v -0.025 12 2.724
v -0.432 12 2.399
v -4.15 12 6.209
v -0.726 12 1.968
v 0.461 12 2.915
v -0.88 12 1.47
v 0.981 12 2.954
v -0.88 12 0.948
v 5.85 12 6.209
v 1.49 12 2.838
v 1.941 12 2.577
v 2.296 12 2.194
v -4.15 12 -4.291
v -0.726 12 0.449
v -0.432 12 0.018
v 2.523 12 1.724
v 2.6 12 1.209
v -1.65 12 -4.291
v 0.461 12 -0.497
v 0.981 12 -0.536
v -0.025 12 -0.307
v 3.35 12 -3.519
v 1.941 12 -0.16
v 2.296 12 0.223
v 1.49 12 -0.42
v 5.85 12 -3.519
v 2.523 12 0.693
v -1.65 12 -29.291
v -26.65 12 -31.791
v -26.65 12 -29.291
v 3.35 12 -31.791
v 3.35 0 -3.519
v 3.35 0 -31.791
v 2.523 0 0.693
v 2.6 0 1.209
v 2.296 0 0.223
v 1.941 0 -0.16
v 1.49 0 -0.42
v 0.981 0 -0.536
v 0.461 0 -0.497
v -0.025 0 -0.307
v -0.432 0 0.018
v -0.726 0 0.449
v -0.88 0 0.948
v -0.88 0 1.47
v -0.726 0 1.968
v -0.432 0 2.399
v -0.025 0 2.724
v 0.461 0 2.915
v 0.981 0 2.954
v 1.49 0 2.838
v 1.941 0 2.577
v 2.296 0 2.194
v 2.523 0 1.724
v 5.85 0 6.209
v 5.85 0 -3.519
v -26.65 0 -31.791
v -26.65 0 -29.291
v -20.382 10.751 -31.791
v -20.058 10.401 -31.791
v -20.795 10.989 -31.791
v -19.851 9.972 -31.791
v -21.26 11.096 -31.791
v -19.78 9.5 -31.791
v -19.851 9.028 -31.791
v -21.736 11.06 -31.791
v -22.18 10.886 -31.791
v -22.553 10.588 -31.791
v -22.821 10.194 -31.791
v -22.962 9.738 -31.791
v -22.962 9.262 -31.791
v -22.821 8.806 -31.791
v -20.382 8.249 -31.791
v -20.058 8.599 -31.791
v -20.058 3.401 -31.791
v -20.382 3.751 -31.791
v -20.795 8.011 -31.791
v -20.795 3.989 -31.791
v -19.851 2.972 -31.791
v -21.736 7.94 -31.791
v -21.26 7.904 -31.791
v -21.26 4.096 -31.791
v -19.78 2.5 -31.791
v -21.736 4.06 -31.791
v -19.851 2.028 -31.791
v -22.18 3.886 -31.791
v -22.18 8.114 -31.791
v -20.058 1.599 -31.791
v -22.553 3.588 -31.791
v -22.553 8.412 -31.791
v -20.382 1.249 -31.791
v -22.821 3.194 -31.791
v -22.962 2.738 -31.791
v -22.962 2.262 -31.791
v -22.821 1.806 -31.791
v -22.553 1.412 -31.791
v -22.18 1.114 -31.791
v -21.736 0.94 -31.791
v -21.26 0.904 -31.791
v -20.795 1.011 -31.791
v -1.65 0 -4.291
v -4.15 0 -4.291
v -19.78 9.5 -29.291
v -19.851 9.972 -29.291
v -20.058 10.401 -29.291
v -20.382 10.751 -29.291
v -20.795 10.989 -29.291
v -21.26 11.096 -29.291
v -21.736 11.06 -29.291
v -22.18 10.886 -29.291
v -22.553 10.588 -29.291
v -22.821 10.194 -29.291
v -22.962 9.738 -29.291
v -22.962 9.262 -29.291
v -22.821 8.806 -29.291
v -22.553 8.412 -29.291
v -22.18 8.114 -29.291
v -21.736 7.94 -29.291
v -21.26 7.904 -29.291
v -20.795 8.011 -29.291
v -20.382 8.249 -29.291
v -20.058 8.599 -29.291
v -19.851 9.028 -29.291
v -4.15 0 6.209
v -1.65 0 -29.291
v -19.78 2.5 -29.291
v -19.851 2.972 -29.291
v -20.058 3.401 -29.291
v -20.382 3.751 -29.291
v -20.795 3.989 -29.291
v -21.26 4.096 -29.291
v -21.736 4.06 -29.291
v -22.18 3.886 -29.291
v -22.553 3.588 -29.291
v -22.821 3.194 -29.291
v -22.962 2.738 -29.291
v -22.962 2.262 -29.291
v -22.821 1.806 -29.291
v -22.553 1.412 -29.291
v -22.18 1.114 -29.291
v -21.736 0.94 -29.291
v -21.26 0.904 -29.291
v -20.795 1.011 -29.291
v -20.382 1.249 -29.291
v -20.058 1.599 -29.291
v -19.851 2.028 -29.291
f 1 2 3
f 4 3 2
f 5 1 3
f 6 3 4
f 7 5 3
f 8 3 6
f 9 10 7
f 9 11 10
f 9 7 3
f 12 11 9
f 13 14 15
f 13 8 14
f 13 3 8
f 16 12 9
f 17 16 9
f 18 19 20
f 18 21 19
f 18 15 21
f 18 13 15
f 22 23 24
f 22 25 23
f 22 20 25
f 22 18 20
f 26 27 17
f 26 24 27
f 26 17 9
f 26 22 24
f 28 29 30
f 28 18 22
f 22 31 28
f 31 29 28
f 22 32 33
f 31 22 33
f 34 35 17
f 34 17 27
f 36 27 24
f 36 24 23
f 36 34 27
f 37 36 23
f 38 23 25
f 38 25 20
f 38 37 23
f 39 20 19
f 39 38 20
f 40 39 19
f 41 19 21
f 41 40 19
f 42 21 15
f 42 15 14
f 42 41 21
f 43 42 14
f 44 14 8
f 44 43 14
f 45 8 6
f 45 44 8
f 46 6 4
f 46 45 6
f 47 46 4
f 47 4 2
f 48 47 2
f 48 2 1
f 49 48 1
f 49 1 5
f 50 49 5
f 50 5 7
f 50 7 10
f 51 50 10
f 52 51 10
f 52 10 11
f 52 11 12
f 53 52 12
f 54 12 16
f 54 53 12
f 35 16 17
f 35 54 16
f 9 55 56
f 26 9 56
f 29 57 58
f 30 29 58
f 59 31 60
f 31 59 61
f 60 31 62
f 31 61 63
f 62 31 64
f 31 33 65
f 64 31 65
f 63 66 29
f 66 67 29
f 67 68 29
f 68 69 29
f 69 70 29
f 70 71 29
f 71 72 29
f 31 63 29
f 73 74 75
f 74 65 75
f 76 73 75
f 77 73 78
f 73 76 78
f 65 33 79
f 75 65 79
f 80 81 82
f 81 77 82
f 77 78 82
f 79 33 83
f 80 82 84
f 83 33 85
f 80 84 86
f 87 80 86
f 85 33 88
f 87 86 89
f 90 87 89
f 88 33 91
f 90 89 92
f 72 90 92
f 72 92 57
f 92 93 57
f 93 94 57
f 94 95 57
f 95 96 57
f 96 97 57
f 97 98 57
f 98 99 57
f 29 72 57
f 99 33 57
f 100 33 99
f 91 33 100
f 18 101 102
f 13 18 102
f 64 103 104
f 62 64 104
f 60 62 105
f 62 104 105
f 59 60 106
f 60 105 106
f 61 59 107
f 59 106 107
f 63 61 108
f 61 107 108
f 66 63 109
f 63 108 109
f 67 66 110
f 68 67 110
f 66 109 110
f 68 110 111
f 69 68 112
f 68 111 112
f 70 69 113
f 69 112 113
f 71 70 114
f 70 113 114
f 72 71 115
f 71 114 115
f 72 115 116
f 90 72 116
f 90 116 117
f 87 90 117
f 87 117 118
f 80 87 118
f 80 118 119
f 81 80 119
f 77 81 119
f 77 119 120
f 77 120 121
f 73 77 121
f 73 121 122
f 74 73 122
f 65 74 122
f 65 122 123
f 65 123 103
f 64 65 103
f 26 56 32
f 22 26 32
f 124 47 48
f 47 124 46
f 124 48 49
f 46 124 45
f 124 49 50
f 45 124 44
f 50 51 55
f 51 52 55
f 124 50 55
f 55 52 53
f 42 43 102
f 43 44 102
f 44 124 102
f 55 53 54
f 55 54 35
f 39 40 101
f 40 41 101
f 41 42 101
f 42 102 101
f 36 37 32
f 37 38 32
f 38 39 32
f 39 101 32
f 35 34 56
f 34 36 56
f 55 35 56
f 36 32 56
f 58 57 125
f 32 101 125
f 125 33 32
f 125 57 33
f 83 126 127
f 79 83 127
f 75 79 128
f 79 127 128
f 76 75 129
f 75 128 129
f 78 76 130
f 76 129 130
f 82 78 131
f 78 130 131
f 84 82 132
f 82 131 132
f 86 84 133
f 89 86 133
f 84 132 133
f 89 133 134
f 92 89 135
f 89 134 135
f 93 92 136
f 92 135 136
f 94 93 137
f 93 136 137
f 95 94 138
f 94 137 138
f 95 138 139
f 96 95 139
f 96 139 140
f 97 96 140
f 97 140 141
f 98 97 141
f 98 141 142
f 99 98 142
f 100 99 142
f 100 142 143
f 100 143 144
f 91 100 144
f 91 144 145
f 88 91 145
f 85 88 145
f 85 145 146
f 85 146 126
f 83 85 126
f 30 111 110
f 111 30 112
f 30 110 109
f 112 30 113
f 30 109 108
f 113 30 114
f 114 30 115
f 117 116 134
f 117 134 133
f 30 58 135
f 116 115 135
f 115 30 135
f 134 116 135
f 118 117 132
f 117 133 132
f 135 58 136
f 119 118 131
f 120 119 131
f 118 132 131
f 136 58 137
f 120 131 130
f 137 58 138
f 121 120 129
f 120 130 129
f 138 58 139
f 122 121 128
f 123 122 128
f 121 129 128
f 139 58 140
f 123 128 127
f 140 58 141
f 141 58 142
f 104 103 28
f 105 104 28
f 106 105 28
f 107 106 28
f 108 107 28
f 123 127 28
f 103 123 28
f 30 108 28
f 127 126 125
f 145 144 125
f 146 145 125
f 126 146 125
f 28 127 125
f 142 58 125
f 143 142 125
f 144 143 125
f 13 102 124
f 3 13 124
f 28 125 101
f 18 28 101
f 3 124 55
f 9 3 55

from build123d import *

# Parameters (mm, degrees)
SKETCH1_R           = 1.75
BOSS_EXTRUDE1_DEPTH = 12
SKETCH3_R           = 1.6
CUT_EXTRUDE1_DEPTH  = 3.5
BOSS_EXTRUDE2_DEPTH = 12


with BuildPart() as part:
    # Sketch1 → Boss-Extrude1 (new body)
    with BuildSketch(Plane(origin=(0, 0, 0), x_dir=(1, 0, 0), z_dir=(0, 1, 0))):
        Polygon((-1.649648438, 29.291322314), (-1.649648438, -3.708677686), (3.350351562, -3.708677686), (3.350351562, 31.791322314), (-26.649648438, 31.791322314), (-26.649648438, 29.291322314), align=None)
        with Locations((0.850351562, -1.208677686)):
            Circle(SKETCH1_R, mode=Mode.SUBTRACT)
    extrude(amount=BOSS_EXTRUDE1_DEPTH)

    # Sketch3 → Cut-Extrude1 (cut, through all)
    with BuildSketch(Plane.XY.offset(-29.291322314)):
        with Locations((-21.379789069, 2.5)):
            Circle(SKETCH3_R)
        with Locations((-21.379789069, 9.5)):
            Circle(SKETCH3_R)
    extrude(amount=-CUT_EXTRUDE1_DEPTH, mode=Mode.SUBTRACT)

    # Sketch4 → Boss-Extrude2 (add, through all)
    with BuildSketch(Plane(origin=(0, 0, 0), x_dir=(1, 0, 0), z_dir=(0, 1, 0))):
        Polygon((-1.649648438, 4.291322314), (-4.149648438, 4.291322314), (-4.149648438, -6.208677686), (5.850351562, -6.208677686), (5.850351562, 3.519074646), (3.350351562, 3.519074646), (3.350351562, -3.708677686), (-1.649648438, -3.708677686), align=None)
    extrude(amount=BOSS_EXTRUDE2_DEPTH)


solid = part.part
